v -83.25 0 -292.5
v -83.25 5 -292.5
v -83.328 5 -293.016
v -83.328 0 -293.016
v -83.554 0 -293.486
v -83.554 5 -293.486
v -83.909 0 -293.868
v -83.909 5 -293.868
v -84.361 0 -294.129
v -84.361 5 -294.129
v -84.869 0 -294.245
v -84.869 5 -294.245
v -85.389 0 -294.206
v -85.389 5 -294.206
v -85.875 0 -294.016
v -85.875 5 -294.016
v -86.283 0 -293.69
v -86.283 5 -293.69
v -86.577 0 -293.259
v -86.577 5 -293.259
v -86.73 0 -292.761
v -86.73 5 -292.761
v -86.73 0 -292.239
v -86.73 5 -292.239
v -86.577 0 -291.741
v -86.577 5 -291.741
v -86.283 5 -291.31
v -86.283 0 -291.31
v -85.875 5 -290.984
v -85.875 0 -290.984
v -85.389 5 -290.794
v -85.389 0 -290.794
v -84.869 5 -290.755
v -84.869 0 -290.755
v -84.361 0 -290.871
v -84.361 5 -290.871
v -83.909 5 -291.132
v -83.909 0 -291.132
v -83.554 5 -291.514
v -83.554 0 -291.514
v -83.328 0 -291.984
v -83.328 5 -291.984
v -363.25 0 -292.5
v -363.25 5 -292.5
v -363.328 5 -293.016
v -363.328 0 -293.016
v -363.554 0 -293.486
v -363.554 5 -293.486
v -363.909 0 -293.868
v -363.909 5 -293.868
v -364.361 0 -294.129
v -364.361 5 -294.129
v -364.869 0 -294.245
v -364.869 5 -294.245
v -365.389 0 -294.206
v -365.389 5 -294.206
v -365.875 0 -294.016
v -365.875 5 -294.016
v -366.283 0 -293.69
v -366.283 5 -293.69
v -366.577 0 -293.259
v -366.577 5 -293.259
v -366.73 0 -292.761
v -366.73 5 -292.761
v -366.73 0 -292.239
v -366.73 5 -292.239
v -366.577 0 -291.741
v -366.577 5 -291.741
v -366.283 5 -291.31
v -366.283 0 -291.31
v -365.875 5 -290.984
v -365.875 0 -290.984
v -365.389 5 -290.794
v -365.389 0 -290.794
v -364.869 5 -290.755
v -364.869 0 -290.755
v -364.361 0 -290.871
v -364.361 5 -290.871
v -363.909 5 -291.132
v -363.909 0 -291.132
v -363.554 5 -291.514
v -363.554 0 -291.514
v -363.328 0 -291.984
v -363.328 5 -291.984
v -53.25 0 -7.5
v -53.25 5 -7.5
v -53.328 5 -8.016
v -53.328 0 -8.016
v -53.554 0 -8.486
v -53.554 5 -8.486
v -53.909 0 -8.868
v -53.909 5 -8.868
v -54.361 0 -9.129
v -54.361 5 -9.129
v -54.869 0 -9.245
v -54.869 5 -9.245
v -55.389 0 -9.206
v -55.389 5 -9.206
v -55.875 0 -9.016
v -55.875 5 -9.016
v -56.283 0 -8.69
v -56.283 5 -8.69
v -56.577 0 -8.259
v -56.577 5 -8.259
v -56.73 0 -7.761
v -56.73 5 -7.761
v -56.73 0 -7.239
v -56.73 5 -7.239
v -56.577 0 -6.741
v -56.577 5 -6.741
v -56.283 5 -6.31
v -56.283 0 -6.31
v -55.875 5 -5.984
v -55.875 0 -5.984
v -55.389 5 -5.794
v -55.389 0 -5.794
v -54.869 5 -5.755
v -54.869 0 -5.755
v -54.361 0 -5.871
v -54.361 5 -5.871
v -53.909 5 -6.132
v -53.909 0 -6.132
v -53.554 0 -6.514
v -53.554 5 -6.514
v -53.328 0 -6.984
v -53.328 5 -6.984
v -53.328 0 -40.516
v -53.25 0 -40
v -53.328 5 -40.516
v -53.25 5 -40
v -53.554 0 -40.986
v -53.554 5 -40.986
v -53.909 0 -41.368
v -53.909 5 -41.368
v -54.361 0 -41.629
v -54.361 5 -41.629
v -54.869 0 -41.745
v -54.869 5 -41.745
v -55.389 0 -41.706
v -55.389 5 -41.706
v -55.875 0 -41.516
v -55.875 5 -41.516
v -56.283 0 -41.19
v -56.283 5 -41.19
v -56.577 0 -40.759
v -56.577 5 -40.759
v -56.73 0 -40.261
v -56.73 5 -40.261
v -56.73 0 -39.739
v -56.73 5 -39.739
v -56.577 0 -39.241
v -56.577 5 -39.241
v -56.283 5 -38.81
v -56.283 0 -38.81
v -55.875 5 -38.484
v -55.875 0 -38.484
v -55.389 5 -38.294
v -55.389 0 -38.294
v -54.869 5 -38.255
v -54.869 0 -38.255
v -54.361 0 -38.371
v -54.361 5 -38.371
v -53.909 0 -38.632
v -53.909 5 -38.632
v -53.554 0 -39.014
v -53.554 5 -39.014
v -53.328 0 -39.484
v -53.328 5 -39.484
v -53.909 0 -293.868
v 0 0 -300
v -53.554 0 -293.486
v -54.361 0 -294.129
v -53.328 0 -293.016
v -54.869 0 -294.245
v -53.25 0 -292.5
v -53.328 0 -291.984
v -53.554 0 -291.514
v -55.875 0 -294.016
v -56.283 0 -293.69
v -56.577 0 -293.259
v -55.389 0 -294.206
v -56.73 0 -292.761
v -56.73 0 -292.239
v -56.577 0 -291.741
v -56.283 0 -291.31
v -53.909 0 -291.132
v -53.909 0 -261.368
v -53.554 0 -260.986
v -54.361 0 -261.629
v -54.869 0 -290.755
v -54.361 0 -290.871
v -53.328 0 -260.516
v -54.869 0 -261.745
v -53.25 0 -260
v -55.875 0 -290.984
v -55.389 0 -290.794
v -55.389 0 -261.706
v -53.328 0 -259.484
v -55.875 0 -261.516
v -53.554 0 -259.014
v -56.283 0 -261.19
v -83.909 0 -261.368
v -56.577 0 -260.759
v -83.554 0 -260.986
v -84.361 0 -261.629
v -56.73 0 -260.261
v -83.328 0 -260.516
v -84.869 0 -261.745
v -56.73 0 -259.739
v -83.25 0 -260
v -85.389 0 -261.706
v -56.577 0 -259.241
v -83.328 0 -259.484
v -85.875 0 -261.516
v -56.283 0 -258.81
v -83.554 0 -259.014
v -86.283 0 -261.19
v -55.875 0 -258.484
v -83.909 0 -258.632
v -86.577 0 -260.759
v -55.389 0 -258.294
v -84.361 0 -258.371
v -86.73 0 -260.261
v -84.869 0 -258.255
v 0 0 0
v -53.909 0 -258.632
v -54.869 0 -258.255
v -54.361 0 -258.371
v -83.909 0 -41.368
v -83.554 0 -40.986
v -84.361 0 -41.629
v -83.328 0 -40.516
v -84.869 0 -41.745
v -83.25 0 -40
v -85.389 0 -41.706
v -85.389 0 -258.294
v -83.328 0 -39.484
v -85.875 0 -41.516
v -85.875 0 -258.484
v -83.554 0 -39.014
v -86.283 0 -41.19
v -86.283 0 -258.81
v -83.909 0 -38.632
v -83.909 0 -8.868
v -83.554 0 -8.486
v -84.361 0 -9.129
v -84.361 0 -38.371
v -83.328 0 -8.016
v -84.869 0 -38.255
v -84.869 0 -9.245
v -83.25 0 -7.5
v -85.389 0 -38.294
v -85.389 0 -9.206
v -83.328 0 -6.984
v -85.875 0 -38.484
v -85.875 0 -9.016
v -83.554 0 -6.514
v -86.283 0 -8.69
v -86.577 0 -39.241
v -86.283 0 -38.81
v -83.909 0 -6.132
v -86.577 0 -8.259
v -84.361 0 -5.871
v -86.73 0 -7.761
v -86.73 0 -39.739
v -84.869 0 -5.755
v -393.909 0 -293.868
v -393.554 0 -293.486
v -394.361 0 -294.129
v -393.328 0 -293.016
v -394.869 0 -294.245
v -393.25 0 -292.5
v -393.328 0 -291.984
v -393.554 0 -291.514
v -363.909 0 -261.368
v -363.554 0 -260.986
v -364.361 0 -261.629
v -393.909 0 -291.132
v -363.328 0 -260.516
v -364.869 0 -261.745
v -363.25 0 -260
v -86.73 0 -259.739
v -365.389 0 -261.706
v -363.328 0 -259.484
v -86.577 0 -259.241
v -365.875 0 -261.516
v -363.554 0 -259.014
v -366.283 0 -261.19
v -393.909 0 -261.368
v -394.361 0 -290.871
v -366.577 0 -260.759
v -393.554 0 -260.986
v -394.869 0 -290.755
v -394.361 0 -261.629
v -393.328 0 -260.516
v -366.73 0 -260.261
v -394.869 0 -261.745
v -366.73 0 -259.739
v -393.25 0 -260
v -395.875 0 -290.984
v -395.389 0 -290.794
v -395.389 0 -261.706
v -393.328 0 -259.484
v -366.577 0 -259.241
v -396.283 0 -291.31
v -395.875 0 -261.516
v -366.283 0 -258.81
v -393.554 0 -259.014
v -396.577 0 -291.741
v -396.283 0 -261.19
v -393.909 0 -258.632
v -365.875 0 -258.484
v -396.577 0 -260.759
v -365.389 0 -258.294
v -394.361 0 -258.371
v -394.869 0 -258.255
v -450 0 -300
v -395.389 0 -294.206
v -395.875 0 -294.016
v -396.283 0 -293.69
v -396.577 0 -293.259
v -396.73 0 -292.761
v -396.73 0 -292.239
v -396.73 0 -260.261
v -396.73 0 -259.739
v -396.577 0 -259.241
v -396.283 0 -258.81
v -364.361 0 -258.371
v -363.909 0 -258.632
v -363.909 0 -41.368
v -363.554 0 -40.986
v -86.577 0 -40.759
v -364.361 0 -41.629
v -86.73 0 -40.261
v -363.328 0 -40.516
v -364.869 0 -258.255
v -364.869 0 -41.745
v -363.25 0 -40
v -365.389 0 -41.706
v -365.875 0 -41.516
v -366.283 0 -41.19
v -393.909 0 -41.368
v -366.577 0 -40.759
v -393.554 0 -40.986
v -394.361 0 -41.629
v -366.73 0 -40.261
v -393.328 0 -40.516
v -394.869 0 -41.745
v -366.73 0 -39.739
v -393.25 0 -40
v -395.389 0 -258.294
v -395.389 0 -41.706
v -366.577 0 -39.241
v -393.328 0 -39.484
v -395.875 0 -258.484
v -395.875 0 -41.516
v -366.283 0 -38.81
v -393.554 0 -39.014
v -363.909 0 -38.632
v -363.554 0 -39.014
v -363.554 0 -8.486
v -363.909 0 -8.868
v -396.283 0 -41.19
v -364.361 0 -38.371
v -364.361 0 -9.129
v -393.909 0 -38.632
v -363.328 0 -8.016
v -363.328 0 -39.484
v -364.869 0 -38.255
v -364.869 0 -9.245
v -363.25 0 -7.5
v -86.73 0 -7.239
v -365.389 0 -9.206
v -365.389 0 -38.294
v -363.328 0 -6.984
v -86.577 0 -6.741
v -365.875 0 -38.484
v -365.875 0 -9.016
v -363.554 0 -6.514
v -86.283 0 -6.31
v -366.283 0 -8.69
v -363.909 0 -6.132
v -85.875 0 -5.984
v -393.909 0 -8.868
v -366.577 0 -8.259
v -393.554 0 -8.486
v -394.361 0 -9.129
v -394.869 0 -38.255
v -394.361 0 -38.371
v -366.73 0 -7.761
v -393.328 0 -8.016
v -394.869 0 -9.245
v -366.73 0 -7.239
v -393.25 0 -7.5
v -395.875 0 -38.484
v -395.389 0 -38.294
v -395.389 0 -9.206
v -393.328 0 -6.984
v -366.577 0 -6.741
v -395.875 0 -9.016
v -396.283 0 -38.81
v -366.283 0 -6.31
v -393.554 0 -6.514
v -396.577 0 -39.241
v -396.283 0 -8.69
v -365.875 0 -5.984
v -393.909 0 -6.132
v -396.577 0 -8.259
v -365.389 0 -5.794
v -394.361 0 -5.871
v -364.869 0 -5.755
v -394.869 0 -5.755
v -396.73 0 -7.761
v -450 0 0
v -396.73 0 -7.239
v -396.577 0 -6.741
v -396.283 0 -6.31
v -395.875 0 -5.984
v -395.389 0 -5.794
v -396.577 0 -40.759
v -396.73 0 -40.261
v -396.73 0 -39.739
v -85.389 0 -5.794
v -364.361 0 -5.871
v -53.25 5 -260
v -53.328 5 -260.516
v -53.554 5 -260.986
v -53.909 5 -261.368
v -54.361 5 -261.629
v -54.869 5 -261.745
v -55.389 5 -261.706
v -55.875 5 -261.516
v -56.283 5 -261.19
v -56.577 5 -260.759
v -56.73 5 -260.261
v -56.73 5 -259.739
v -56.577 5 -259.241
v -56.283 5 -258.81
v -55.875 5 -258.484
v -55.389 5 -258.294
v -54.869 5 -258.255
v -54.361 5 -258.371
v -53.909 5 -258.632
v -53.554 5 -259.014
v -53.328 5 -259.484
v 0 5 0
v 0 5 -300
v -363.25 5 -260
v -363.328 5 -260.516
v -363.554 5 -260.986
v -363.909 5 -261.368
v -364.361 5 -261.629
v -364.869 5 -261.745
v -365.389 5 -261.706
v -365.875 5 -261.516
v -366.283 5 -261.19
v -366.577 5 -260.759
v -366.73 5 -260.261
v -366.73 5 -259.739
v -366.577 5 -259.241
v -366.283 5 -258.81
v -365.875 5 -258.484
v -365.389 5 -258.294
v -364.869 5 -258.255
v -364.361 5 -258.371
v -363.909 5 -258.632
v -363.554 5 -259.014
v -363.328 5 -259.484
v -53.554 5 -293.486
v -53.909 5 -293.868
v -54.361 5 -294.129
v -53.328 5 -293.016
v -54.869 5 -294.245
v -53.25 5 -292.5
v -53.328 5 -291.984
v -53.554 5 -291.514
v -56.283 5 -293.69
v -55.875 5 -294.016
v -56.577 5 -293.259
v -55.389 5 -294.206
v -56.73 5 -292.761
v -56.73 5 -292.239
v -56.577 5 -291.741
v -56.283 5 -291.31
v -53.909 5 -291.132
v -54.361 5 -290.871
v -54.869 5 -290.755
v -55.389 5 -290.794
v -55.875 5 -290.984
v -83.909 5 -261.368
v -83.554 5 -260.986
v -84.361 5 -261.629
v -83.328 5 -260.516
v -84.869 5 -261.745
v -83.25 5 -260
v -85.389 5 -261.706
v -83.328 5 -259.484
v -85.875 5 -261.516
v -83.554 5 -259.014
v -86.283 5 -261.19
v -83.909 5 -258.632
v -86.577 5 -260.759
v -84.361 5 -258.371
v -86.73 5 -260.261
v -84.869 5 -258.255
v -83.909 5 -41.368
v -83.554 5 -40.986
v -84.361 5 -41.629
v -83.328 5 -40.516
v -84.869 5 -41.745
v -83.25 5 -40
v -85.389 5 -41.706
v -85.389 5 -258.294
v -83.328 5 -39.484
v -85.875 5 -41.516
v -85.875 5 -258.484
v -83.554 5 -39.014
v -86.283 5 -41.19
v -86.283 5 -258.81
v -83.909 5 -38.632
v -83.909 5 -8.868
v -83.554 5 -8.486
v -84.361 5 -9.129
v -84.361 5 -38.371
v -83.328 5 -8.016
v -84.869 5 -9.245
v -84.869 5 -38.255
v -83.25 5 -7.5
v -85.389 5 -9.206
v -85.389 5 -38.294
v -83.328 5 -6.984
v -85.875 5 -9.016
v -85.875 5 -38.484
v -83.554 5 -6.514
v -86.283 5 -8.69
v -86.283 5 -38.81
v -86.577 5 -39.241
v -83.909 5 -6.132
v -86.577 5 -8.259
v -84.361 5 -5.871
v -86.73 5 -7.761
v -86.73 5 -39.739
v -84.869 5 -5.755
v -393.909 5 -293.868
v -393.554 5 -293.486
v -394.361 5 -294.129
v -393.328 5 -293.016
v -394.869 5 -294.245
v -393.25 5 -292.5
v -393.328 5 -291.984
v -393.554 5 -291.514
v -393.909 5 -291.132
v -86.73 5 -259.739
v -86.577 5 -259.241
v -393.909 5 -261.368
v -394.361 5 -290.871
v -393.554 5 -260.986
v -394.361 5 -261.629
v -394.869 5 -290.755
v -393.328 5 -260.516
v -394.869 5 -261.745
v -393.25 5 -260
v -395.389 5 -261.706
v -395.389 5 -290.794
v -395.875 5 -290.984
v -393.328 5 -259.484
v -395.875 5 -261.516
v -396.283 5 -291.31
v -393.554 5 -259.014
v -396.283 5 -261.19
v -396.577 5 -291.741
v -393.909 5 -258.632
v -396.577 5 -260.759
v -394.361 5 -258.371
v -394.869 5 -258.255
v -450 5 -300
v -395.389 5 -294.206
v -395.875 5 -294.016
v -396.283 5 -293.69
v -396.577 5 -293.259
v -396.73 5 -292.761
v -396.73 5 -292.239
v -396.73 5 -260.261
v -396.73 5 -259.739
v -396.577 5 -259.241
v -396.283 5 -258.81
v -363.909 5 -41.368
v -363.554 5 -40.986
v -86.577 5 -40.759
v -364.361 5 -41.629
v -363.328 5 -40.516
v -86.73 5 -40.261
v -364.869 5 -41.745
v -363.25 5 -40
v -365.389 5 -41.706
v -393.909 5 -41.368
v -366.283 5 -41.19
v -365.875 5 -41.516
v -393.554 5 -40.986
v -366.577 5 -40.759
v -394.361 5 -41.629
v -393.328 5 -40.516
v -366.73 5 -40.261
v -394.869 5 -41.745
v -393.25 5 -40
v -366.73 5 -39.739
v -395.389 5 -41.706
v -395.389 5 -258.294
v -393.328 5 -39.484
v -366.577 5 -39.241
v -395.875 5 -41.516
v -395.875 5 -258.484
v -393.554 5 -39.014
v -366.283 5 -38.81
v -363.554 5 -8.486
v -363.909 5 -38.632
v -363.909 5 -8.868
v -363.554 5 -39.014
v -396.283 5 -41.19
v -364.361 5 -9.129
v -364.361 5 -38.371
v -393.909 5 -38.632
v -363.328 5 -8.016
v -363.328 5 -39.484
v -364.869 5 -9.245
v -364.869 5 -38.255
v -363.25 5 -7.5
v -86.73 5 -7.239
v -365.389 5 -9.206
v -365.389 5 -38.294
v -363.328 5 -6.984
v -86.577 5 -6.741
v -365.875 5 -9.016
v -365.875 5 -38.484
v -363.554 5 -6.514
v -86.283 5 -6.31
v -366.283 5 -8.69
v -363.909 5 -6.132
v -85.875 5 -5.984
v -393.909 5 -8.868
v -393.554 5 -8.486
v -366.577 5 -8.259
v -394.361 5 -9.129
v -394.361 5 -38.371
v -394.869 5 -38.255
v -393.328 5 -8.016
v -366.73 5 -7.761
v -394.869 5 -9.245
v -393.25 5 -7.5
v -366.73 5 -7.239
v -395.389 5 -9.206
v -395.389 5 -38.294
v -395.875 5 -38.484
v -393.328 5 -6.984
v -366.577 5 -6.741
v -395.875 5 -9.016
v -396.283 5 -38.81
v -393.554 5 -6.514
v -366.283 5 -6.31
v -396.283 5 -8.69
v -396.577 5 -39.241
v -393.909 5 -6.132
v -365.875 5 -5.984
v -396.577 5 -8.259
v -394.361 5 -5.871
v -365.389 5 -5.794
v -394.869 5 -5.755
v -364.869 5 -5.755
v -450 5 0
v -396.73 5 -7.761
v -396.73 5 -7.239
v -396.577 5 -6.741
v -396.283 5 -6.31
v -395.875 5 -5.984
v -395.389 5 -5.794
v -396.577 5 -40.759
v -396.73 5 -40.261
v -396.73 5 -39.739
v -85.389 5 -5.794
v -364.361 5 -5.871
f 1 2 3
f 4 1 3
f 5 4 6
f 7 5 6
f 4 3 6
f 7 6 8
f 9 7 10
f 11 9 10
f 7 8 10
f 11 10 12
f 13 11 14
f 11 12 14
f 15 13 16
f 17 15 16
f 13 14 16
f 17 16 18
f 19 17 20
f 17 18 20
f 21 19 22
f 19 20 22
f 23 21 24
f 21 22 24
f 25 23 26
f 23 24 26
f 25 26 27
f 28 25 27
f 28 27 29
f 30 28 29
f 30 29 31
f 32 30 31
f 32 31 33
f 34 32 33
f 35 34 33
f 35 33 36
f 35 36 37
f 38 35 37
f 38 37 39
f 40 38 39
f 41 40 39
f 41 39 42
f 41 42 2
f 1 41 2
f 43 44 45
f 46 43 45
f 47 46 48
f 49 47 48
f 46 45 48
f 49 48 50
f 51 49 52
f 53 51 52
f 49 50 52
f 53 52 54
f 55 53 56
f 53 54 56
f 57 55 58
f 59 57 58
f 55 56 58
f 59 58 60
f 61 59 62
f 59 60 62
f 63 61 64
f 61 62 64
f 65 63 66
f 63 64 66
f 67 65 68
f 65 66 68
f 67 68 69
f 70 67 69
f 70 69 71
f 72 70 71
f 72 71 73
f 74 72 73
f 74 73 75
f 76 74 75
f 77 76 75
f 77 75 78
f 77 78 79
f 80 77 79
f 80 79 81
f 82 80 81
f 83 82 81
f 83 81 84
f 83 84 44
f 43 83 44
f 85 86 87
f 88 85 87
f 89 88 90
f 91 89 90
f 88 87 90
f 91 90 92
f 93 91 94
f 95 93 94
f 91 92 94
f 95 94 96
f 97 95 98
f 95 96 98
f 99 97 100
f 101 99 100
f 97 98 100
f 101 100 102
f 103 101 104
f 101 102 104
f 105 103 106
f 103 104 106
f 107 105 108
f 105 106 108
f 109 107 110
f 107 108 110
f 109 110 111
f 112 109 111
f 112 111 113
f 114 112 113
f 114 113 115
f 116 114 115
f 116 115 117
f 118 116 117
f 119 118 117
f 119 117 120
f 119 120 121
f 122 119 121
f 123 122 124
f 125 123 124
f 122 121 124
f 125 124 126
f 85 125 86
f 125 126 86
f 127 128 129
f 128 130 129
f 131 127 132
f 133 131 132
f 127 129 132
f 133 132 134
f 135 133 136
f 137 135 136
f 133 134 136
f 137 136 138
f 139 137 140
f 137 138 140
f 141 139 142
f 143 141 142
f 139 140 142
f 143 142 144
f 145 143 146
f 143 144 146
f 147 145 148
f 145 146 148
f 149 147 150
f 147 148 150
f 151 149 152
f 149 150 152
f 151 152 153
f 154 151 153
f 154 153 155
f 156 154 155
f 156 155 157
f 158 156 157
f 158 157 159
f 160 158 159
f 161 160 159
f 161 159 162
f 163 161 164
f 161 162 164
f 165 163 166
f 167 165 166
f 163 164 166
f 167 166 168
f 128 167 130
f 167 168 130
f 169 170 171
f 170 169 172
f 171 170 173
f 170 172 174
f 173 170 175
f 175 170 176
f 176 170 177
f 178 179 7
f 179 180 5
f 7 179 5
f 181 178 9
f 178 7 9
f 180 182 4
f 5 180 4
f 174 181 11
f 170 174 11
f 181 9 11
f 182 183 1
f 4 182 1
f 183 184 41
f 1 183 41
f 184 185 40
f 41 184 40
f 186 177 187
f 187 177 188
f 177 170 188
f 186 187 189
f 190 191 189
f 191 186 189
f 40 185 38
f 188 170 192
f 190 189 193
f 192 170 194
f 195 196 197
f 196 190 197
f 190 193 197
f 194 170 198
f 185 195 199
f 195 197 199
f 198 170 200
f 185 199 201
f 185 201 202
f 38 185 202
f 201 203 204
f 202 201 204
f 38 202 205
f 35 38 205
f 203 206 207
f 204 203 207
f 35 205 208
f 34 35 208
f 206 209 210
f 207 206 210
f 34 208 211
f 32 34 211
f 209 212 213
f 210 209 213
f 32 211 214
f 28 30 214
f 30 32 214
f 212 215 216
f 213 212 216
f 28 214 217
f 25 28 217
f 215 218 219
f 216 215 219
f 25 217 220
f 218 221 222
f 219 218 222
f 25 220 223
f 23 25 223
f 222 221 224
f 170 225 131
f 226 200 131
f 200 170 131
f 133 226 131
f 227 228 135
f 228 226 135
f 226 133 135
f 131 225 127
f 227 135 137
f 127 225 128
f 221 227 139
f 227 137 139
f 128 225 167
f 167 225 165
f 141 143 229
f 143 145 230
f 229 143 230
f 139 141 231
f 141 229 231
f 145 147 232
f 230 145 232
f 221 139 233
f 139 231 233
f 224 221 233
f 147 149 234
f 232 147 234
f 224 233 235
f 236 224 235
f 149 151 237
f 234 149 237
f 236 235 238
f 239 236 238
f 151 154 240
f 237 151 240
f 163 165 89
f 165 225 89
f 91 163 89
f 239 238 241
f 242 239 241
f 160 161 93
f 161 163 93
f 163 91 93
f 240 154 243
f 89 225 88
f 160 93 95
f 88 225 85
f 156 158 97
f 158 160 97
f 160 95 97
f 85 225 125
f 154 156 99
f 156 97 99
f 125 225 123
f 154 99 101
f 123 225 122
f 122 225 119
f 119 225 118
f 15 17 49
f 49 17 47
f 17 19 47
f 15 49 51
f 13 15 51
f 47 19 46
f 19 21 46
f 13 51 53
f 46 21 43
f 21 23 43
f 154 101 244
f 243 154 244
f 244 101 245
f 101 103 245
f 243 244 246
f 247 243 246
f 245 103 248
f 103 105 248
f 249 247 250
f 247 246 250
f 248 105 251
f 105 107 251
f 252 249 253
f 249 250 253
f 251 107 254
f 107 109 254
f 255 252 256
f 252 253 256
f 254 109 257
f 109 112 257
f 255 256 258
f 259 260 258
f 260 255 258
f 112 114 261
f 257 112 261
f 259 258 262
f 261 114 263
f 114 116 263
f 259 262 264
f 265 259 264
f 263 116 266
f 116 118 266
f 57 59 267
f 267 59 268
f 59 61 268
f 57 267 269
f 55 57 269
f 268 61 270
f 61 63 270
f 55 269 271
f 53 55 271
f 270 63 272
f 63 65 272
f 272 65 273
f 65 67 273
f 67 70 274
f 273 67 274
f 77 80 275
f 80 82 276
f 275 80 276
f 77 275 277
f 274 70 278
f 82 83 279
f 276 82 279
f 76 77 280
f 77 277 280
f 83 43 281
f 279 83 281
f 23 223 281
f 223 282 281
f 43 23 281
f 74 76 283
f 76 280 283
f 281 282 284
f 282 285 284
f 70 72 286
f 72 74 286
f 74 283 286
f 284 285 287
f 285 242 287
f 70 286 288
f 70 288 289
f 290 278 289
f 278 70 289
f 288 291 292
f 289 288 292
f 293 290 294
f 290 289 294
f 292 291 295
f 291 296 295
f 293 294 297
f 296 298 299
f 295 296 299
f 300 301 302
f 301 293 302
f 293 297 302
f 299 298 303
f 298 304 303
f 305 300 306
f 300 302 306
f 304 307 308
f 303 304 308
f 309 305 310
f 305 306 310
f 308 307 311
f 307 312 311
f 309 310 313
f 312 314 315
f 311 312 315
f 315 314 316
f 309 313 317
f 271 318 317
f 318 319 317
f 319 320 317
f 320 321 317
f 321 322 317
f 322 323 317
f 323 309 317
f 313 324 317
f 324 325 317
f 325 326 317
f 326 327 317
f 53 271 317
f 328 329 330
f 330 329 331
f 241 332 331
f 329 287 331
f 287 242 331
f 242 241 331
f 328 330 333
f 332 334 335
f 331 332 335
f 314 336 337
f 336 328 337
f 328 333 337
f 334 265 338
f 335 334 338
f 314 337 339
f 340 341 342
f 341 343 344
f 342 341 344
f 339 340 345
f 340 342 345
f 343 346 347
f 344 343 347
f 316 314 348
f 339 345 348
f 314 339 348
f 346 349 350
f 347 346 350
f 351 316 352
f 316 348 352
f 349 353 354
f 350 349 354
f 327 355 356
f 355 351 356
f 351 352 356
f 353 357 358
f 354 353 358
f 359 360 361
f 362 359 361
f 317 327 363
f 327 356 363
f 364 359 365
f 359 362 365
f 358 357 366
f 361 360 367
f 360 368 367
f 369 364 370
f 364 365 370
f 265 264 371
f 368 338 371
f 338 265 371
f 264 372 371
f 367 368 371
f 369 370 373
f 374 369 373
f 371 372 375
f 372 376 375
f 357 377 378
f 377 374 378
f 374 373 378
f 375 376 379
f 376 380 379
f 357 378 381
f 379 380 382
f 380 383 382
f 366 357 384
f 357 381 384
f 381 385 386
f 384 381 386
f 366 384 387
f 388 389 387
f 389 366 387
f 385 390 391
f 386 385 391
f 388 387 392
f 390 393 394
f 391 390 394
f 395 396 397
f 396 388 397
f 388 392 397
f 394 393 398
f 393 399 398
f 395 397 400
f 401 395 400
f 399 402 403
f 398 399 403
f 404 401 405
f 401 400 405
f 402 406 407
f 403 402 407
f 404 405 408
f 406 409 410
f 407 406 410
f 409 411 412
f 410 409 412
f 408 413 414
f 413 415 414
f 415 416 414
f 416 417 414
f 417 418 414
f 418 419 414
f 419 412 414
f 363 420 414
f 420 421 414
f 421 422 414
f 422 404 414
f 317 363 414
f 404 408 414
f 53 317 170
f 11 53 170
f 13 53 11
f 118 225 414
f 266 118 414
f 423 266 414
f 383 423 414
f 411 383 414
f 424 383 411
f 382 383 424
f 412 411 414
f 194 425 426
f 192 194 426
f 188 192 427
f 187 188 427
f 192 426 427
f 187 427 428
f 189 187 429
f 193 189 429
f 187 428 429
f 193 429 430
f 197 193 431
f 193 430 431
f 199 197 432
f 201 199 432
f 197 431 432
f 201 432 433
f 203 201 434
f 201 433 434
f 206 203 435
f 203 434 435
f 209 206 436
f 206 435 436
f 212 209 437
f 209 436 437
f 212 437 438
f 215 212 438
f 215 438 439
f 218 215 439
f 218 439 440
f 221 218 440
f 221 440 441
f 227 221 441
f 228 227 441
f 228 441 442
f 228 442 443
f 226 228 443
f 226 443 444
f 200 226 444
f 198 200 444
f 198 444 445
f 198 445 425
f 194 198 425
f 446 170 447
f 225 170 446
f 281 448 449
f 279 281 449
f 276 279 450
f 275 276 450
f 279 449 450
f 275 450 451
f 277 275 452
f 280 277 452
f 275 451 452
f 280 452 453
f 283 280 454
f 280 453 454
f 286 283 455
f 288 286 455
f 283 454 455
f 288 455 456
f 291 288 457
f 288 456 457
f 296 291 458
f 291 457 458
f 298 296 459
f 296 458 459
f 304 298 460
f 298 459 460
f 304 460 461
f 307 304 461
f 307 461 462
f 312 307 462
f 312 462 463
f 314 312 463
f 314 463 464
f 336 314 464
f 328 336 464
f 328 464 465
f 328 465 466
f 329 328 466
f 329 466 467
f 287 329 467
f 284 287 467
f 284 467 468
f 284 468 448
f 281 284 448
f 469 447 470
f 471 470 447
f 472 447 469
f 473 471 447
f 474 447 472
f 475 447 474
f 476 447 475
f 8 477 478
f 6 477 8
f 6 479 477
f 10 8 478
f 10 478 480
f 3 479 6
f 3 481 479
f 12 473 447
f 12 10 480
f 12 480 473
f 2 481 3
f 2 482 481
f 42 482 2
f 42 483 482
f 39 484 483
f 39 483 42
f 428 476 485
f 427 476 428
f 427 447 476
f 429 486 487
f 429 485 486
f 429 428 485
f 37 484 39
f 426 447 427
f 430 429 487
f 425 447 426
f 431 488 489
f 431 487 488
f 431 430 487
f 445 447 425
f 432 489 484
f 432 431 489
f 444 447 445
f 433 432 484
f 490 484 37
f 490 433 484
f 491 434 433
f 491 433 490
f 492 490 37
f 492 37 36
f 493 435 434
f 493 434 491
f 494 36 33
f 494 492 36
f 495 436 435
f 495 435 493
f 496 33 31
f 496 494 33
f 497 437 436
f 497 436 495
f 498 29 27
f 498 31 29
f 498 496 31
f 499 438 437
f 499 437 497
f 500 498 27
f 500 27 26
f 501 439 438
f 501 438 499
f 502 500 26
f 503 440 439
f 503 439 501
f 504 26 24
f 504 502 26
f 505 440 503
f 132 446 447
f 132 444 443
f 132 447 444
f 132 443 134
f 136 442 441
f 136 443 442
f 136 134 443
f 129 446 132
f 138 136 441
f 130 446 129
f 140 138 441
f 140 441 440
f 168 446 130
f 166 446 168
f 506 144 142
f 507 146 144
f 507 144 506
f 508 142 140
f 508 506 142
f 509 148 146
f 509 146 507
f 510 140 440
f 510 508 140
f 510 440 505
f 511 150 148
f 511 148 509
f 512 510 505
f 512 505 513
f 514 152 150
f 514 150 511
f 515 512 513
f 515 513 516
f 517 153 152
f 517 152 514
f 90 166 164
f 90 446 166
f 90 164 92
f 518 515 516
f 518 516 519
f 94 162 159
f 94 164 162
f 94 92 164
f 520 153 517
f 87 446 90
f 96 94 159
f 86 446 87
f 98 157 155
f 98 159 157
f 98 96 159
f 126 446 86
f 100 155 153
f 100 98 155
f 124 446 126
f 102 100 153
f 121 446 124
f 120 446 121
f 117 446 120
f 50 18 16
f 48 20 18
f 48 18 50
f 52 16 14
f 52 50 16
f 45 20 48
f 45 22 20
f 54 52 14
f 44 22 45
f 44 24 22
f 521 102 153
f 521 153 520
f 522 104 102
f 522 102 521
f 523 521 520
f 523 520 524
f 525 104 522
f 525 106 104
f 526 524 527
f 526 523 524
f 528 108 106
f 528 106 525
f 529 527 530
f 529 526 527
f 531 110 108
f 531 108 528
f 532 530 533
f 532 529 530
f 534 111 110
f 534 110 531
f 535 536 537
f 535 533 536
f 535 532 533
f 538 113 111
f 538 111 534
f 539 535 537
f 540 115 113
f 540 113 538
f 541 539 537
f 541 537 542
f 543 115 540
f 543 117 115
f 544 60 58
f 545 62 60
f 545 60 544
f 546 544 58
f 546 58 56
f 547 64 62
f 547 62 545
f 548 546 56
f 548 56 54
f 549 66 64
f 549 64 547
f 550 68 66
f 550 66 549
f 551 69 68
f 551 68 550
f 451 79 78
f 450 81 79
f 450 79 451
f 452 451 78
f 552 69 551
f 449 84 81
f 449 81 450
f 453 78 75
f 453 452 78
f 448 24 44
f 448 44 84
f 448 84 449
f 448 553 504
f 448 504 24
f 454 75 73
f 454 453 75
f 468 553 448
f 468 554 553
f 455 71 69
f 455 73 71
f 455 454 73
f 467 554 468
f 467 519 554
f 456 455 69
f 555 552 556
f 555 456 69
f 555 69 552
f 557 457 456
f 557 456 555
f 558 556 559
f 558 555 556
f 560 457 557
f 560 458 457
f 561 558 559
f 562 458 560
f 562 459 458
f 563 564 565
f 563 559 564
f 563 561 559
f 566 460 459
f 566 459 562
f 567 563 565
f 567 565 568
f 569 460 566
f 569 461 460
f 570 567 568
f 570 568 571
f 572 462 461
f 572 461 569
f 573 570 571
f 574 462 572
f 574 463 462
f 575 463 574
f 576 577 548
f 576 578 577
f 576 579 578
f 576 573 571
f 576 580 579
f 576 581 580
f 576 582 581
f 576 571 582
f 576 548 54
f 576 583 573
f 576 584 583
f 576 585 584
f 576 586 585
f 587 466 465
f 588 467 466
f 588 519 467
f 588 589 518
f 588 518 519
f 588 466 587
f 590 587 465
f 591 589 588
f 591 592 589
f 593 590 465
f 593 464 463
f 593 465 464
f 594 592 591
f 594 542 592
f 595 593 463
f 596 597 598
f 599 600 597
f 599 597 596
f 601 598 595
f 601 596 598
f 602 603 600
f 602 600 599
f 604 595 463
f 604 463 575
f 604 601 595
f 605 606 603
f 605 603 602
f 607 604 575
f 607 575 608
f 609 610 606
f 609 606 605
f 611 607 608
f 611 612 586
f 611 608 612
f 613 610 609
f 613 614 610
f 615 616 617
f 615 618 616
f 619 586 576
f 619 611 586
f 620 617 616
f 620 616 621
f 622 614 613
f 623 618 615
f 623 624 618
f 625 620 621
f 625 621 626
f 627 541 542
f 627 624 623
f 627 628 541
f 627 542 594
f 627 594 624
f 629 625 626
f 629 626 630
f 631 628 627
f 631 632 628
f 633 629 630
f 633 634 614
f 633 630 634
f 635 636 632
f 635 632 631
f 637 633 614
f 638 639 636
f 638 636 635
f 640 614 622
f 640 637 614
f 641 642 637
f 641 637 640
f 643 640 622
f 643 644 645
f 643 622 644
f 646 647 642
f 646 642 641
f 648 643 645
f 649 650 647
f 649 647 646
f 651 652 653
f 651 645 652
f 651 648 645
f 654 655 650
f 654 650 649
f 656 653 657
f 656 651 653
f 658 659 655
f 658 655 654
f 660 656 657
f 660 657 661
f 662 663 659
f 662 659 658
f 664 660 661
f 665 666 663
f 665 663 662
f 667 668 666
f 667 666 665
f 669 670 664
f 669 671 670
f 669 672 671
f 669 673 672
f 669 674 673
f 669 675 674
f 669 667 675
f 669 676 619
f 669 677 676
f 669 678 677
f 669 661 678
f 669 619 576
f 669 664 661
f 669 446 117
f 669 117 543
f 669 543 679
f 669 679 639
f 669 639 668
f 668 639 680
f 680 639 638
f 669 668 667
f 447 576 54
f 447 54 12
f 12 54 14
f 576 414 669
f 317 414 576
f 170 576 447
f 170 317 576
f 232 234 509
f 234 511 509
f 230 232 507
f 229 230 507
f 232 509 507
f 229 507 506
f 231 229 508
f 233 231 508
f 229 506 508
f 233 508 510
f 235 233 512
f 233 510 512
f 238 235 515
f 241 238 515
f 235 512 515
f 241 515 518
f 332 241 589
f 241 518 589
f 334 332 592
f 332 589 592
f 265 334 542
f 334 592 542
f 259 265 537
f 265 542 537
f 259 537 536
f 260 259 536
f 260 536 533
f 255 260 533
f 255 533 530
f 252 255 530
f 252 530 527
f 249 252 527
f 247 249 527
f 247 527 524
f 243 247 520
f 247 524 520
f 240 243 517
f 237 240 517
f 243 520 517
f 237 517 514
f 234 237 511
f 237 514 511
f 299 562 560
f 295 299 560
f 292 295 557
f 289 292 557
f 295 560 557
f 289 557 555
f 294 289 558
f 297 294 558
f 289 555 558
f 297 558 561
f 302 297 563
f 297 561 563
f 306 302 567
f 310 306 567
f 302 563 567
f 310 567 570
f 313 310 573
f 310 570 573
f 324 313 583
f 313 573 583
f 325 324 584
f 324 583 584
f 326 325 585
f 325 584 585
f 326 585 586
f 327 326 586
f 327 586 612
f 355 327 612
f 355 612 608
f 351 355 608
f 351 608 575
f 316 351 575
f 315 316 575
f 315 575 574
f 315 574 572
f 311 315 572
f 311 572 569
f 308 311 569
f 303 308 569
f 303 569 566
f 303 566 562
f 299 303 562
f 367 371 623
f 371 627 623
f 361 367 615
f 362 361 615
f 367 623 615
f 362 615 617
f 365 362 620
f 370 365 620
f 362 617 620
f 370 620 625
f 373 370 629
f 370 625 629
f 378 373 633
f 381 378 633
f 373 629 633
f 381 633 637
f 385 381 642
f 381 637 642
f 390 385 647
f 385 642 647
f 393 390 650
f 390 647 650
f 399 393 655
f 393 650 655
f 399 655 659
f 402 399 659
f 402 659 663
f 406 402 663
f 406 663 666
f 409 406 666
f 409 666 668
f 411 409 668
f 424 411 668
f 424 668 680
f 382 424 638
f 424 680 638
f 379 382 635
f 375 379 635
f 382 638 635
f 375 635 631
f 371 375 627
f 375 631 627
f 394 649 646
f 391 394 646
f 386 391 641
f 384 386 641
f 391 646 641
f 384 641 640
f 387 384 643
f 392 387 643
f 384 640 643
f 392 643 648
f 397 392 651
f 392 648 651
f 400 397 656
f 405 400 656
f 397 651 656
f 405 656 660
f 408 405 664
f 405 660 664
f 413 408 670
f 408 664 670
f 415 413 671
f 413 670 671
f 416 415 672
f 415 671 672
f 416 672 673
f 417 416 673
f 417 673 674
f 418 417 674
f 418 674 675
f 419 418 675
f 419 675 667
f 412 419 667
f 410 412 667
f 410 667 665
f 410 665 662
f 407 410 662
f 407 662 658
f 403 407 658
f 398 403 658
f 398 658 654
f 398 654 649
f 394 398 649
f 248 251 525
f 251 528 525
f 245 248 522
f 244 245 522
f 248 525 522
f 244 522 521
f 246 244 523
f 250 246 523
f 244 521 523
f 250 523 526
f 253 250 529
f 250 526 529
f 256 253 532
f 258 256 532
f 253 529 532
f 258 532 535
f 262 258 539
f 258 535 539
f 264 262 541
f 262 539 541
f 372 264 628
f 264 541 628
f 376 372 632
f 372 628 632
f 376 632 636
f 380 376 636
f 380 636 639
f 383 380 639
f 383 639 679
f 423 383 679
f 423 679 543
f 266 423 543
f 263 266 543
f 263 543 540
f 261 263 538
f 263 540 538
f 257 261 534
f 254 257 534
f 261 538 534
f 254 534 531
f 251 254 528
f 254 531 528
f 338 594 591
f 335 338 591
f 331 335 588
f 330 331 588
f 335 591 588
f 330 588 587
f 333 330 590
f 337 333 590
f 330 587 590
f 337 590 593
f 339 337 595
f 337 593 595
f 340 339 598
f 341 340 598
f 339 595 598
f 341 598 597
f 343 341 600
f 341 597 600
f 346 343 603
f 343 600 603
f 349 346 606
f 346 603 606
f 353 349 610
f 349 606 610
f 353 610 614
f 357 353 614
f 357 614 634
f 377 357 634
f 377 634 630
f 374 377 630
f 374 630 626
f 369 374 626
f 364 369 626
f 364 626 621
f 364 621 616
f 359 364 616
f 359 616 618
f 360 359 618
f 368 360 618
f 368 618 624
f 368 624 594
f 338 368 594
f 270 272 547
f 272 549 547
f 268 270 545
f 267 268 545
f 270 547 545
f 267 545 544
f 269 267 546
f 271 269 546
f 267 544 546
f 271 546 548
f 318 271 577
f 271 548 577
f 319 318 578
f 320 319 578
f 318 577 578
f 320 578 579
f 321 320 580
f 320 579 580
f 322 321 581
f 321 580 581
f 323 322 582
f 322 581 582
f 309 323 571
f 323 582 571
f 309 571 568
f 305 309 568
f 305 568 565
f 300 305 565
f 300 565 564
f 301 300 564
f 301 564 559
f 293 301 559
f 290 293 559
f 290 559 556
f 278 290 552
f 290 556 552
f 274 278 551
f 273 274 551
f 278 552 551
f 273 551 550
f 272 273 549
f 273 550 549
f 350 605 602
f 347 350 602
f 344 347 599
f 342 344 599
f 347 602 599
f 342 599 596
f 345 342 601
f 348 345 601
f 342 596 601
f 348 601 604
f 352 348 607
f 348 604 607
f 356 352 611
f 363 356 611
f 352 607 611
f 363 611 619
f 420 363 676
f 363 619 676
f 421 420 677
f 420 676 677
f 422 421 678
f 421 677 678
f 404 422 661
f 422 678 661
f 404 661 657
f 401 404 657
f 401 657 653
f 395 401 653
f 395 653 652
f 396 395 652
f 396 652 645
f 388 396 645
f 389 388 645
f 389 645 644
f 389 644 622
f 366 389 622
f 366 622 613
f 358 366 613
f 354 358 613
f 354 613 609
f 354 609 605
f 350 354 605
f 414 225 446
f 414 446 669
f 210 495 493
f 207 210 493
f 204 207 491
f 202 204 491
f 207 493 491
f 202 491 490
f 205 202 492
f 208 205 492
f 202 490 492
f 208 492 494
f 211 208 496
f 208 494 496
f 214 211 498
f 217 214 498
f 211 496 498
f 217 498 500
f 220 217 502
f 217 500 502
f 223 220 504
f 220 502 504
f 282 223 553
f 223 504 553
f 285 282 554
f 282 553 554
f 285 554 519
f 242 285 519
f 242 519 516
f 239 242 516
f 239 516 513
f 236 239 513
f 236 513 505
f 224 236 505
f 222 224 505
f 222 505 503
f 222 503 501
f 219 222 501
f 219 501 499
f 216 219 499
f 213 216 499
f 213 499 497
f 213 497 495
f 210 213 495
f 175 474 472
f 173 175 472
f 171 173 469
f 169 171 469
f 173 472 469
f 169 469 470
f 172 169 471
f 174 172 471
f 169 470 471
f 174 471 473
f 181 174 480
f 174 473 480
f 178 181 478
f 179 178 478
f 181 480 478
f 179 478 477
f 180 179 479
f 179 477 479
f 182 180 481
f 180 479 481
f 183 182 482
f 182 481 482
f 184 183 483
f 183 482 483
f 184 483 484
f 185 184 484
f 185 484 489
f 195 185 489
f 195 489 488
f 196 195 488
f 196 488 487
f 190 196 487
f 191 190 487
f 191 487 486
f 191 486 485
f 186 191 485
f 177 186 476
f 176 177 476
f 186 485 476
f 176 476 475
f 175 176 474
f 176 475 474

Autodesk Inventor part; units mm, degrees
ref_plane "YZ Plane" through (0, 0, 0) normal (1, 0, 0) x (0, 1, 0)
ref_plane "XZ Plane" through (0, 0, 0) normal (0, 1, 0) x (-1, 0, 0)
ref_plane "XY Plane" through (0, 0, 0) normal (0, 0, 1) x (1, 0, 0)
sketch "Sketch1" plane through (0, 0, 0) normal (0, 1, 0) x (-1, 0, 0)
  line L0 (0, 0) -> (450, 0)
  line L1 (450, 0) -> (450, -300)
  line L2 (450, -300) -> (0, -300)
  line L3 (0, -300) -> (0, 0)
  dimension "d0" = 450
  dimension "d1" = 300
extrude "Extrusion1" add sketch "Sketch1" along normal blind 5
sketch "Sketch2" plane through (0, 5, 0) normal (0, 1, 0) x (1, 0, 0)
  circle A0 centre (-55, 7.5) radius 1.75
  circle A1 centre (-55, 40) radius 1.75
  circle A2 centre (-85, 7.5) radius 1.75
  circle A3 centre (-85, 40) radius 1.75
  line L0 (0, 104.657) -> (0, 226.0583) construction
  line L1 (0, 0) -> (0, 300) construction
  circle A4 centre (-55, 260) radius 1.75
  circle A5 centre (-55, 292.5) radius 1.75
  circle A6 centre (-85, 260) radius 1.75
  circle A7 centre (-85, 292.5) radius 1.75
  line L2 (-450, 0) -> (0, 0) construction
  line L3 (-77.4228, 0) -> (-201.8841, 0) construction
  circle A8 centre (-365, 260) radius 1.75
  circle A9 centre (-365, 292.5) radius 1.75
  circle A10 centre (-395, 260) radius 1.75
  circle A11 centre (-395, 292.5) radius 1.75
  circle A12 centre (-365, 7.5) radius 1.75
  circle A13 centre (-365, 40) radius 1.75
  circle A14 centre (-395, 7.5) radius 1.75
  circle A15 centre (-395, 40) radius 1.75
  point P0 (-387.4228, 0)
  dimension "d5" = 3.5
  dimension "d7" = 3.5
  dimension "d8" = 3.5
  dimension "d9" = 3.5
  dimension "d12" = 252.5
  dimension "d19" = 310
extrude "Extrusion2" cut sketch "Sketch2" against normal blind 310
equation "\"d24\" = d19"
properties part number "ChassisTest"
